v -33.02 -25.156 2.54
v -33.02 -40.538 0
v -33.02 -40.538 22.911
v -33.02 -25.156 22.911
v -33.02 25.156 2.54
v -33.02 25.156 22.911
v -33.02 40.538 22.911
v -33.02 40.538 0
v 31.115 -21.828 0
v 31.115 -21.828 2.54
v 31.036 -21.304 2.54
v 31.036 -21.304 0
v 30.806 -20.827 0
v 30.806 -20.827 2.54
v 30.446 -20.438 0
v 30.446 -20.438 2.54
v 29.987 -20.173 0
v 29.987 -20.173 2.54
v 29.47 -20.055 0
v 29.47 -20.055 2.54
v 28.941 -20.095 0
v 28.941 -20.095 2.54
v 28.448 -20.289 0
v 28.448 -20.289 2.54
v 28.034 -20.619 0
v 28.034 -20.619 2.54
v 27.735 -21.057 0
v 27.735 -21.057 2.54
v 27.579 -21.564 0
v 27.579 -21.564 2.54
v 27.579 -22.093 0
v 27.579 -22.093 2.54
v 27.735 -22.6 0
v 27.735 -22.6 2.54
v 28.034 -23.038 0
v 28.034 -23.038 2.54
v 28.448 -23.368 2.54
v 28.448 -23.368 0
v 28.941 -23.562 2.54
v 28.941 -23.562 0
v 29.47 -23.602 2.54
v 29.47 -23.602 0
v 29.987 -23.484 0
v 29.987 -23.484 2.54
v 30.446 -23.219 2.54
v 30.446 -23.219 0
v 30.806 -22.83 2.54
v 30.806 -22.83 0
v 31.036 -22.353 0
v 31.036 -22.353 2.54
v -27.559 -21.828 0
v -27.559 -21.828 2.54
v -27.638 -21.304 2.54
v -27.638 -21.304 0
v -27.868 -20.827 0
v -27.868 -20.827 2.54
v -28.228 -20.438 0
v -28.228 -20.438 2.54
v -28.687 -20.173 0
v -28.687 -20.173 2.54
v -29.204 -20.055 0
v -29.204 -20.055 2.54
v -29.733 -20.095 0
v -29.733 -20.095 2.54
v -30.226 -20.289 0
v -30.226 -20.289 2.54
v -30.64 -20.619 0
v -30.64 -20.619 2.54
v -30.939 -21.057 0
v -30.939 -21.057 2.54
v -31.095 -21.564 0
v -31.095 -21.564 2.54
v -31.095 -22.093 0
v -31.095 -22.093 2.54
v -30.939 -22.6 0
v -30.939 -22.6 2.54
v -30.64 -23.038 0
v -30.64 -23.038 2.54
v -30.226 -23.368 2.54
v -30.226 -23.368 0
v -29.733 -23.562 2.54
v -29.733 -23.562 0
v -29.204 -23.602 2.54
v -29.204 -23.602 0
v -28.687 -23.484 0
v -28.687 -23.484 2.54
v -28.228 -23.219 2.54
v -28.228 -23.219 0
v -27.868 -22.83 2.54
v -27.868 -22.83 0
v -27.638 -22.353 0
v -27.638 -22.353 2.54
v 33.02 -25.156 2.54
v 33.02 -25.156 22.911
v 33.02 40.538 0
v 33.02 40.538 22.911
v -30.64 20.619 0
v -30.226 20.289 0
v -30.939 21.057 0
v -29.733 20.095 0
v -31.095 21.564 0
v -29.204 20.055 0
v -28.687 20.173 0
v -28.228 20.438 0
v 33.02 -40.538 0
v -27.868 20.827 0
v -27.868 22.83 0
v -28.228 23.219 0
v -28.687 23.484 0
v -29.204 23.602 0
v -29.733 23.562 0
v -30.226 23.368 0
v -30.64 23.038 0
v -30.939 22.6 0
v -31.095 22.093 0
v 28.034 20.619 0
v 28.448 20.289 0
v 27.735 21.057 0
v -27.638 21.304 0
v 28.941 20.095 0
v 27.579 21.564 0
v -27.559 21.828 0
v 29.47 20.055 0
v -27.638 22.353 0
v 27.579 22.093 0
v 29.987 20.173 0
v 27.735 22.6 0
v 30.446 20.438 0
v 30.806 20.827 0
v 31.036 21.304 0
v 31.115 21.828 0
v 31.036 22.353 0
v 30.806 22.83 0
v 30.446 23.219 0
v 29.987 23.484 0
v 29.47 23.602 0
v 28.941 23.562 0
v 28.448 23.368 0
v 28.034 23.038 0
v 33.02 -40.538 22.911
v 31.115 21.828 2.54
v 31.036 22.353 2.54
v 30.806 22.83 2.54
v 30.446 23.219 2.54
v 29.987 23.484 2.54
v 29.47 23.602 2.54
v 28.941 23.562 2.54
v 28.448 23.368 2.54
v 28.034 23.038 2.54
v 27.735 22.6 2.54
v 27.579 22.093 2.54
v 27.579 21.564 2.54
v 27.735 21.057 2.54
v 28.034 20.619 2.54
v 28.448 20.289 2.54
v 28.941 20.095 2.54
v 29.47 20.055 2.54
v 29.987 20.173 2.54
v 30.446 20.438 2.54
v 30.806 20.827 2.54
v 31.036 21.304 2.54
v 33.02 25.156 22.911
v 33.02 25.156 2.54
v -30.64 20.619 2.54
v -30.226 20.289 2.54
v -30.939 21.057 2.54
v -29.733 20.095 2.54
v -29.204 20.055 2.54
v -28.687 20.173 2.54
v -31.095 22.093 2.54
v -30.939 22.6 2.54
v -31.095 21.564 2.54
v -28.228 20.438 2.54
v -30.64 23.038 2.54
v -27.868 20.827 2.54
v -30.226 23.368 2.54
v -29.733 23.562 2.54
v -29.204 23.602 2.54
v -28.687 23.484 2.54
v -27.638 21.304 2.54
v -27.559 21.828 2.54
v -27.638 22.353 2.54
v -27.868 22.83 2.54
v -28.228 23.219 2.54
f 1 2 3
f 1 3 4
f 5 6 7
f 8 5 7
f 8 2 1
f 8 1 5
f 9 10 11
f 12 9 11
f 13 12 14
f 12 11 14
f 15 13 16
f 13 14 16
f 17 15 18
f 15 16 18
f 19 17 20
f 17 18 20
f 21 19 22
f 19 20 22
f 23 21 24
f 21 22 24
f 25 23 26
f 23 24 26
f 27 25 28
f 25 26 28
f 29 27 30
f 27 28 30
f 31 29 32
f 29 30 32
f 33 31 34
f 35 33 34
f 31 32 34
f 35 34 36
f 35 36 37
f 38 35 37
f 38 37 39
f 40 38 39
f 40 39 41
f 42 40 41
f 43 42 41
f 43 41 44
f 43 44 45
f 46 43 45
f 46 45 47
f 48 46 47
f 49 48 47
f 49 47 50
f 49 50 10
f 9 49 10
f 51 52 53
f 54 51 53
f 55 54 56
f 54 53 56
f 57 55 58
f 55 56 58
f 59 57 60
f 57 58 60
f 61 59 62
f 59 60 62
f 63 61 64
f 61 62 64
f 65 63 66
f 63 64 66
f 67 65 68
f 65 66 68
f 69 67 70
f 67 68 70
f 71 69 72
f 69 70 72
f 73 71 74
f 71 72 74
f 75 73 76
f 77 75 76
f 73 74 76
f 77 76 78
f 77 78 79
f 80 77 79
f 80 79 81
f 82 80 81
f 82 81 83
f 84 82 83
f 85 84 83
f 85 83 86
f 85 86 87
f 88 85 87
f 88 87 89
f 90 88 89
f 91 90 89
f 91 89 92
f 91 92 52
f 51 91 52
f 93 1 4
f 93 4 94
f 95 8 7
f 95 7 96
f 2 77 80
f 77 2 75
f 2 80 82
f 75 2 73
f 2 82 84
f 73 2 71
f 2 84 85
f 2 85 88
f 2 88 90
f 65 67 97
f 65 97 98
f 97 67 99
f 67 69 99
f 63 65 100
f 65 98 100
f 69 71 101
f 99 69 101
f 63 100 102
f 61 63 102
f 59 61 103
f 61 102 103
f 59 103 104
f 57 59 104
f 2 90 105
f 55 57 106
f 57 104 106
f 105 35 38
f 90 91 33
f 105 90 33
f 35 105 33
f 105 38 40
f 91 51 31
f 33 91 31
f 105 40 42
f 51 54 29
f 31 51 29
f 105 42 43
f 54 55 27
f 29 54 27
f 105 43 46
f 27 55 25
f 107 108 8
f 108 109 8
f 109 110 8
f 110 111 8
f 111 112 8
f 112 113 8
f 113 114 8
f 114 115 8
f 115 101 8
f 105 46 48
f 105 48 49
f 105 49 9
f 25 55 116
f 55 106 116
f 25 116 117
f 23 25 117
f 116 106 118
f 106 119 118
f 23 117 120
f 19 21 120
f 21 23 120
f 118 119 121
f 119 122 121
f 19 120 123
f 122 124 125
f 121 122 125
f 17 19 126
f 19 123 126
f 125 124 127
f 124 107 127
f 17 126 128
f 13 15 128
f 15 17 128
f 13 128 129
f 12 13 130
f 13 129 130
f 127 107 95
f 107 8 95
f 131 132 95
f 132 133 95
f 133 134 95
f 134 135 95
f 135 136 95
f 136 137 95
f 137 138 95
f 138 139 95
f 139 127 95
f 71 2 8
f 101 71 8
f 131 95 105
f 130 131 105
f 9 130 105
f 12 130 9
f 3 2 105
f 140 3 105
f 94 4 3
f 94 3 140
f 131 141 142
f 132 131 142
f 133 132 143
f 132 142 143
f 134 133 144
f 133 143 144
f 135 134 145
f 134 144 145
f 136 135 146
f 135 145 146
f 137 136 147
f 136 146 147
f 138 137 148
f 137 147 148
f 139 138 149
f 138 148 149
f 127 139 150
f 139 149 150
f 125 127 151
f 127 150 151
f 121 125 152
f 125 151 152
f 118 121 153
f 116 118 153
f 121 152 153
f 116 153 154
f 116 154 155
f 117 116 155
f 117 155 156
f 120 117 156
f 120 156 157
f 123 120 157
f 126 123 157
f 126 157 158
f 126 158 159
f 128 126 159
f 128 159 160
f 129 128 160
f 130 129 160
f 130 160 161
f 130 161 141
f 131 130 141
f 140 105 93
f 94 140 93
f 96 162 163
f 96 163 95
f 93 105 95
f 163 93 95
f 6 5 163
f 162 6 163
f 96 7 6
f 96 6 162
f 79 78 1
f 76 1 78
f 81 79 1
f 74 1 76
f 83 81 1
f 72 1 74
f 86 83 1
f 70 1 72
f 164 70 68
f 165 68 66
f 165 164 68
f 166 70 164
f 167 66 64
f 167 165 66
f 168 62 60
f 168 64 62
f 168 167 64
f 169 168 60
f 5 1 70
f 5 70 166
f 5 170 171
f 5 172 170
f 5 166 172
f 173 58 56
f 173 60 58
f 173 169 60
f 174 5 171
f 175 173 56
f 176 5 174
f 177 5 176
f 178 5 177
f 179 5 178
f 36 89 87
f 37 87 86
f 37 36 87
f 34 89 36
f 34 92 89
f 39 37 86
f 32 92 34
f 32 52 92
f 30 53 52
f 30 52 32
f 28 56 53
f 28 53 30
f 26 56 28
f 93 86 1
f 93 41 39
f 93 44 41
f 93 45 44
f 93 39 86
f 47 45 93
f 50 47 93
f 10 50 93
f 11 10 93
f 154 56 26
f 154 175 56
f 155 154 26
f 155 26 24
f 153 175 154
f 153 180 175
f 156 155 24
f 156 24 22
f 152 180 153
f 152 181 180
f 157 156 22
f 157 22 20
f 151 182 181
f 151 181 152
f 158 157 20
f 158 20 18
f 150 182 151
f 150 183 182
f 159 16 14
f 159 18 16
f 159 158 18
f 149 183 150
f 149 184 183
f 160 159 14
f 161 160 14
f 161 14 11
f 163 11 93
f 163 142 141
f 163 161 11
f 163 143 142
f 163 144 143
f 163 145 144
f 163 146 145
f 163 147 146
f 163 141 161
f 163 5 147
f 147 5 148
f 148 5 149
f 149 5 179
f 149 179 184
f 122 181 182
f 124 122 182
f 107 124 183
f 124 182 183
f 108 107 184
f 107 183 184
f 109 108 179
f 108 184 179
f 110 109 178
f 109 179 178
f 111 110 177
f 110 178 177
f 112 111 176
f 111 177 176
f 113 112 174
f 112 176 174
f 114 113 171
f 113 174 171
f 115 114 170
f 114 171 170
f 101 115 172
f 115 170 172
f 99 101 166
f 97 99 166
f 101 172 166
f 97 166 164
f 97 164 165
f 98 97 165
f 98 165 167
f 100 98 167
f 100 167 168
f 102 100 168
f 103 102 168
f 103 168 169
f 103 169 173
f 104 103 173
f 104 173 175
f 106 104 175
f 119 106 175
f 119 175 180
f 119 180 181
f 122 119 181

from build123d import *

# Parameters (mm, degrees)
F0_W     = 66.04
F0_H     = 81.077
F1_DEPTH = 2.54
F2_W     = 66.04
F2_H     = 15.383
F3_DEPTH = 20.371
F4_R     = 1.778
F5_DEPTH = 25


with BuildPart() as f1:
    # F0 (on Top) → F1 (new body)
    with BuildSketch(Plane.XY):
        Rectangle(F0_W, F0_H)
    extrude(amount=F1_DEPTH)

    # F2 (on face) → F3 (join)
    with BuildSketch(Plane.XY.offset(2.54)):
        with Locations((0, 32.847)):
            Rectangle(F2_W, F2_H)
        with Locations((0, -32.847)):
            Rectangle(F2_W, F2_H)
    extrude(amount=F3_DEPTH)

    # F4 (on face) → F5 (cut)
    with BuildSketch(Plane.XY.offset(2.54)):
        with Locations((-29.337, 21.8285)):
            Circle(F4_R)
        with Locations((29.337, 21.8285)):
            Circle(F4_R)
        with Locations((29.337, -21.8285)):
            Circle(F4_R)
        with Locations((-29.337, -21.8285)):
            Circle(F4_R)
    extrude(amount=-F5_DEPTH, mode=Mode.SUBTRACT)


solid = f1.part
